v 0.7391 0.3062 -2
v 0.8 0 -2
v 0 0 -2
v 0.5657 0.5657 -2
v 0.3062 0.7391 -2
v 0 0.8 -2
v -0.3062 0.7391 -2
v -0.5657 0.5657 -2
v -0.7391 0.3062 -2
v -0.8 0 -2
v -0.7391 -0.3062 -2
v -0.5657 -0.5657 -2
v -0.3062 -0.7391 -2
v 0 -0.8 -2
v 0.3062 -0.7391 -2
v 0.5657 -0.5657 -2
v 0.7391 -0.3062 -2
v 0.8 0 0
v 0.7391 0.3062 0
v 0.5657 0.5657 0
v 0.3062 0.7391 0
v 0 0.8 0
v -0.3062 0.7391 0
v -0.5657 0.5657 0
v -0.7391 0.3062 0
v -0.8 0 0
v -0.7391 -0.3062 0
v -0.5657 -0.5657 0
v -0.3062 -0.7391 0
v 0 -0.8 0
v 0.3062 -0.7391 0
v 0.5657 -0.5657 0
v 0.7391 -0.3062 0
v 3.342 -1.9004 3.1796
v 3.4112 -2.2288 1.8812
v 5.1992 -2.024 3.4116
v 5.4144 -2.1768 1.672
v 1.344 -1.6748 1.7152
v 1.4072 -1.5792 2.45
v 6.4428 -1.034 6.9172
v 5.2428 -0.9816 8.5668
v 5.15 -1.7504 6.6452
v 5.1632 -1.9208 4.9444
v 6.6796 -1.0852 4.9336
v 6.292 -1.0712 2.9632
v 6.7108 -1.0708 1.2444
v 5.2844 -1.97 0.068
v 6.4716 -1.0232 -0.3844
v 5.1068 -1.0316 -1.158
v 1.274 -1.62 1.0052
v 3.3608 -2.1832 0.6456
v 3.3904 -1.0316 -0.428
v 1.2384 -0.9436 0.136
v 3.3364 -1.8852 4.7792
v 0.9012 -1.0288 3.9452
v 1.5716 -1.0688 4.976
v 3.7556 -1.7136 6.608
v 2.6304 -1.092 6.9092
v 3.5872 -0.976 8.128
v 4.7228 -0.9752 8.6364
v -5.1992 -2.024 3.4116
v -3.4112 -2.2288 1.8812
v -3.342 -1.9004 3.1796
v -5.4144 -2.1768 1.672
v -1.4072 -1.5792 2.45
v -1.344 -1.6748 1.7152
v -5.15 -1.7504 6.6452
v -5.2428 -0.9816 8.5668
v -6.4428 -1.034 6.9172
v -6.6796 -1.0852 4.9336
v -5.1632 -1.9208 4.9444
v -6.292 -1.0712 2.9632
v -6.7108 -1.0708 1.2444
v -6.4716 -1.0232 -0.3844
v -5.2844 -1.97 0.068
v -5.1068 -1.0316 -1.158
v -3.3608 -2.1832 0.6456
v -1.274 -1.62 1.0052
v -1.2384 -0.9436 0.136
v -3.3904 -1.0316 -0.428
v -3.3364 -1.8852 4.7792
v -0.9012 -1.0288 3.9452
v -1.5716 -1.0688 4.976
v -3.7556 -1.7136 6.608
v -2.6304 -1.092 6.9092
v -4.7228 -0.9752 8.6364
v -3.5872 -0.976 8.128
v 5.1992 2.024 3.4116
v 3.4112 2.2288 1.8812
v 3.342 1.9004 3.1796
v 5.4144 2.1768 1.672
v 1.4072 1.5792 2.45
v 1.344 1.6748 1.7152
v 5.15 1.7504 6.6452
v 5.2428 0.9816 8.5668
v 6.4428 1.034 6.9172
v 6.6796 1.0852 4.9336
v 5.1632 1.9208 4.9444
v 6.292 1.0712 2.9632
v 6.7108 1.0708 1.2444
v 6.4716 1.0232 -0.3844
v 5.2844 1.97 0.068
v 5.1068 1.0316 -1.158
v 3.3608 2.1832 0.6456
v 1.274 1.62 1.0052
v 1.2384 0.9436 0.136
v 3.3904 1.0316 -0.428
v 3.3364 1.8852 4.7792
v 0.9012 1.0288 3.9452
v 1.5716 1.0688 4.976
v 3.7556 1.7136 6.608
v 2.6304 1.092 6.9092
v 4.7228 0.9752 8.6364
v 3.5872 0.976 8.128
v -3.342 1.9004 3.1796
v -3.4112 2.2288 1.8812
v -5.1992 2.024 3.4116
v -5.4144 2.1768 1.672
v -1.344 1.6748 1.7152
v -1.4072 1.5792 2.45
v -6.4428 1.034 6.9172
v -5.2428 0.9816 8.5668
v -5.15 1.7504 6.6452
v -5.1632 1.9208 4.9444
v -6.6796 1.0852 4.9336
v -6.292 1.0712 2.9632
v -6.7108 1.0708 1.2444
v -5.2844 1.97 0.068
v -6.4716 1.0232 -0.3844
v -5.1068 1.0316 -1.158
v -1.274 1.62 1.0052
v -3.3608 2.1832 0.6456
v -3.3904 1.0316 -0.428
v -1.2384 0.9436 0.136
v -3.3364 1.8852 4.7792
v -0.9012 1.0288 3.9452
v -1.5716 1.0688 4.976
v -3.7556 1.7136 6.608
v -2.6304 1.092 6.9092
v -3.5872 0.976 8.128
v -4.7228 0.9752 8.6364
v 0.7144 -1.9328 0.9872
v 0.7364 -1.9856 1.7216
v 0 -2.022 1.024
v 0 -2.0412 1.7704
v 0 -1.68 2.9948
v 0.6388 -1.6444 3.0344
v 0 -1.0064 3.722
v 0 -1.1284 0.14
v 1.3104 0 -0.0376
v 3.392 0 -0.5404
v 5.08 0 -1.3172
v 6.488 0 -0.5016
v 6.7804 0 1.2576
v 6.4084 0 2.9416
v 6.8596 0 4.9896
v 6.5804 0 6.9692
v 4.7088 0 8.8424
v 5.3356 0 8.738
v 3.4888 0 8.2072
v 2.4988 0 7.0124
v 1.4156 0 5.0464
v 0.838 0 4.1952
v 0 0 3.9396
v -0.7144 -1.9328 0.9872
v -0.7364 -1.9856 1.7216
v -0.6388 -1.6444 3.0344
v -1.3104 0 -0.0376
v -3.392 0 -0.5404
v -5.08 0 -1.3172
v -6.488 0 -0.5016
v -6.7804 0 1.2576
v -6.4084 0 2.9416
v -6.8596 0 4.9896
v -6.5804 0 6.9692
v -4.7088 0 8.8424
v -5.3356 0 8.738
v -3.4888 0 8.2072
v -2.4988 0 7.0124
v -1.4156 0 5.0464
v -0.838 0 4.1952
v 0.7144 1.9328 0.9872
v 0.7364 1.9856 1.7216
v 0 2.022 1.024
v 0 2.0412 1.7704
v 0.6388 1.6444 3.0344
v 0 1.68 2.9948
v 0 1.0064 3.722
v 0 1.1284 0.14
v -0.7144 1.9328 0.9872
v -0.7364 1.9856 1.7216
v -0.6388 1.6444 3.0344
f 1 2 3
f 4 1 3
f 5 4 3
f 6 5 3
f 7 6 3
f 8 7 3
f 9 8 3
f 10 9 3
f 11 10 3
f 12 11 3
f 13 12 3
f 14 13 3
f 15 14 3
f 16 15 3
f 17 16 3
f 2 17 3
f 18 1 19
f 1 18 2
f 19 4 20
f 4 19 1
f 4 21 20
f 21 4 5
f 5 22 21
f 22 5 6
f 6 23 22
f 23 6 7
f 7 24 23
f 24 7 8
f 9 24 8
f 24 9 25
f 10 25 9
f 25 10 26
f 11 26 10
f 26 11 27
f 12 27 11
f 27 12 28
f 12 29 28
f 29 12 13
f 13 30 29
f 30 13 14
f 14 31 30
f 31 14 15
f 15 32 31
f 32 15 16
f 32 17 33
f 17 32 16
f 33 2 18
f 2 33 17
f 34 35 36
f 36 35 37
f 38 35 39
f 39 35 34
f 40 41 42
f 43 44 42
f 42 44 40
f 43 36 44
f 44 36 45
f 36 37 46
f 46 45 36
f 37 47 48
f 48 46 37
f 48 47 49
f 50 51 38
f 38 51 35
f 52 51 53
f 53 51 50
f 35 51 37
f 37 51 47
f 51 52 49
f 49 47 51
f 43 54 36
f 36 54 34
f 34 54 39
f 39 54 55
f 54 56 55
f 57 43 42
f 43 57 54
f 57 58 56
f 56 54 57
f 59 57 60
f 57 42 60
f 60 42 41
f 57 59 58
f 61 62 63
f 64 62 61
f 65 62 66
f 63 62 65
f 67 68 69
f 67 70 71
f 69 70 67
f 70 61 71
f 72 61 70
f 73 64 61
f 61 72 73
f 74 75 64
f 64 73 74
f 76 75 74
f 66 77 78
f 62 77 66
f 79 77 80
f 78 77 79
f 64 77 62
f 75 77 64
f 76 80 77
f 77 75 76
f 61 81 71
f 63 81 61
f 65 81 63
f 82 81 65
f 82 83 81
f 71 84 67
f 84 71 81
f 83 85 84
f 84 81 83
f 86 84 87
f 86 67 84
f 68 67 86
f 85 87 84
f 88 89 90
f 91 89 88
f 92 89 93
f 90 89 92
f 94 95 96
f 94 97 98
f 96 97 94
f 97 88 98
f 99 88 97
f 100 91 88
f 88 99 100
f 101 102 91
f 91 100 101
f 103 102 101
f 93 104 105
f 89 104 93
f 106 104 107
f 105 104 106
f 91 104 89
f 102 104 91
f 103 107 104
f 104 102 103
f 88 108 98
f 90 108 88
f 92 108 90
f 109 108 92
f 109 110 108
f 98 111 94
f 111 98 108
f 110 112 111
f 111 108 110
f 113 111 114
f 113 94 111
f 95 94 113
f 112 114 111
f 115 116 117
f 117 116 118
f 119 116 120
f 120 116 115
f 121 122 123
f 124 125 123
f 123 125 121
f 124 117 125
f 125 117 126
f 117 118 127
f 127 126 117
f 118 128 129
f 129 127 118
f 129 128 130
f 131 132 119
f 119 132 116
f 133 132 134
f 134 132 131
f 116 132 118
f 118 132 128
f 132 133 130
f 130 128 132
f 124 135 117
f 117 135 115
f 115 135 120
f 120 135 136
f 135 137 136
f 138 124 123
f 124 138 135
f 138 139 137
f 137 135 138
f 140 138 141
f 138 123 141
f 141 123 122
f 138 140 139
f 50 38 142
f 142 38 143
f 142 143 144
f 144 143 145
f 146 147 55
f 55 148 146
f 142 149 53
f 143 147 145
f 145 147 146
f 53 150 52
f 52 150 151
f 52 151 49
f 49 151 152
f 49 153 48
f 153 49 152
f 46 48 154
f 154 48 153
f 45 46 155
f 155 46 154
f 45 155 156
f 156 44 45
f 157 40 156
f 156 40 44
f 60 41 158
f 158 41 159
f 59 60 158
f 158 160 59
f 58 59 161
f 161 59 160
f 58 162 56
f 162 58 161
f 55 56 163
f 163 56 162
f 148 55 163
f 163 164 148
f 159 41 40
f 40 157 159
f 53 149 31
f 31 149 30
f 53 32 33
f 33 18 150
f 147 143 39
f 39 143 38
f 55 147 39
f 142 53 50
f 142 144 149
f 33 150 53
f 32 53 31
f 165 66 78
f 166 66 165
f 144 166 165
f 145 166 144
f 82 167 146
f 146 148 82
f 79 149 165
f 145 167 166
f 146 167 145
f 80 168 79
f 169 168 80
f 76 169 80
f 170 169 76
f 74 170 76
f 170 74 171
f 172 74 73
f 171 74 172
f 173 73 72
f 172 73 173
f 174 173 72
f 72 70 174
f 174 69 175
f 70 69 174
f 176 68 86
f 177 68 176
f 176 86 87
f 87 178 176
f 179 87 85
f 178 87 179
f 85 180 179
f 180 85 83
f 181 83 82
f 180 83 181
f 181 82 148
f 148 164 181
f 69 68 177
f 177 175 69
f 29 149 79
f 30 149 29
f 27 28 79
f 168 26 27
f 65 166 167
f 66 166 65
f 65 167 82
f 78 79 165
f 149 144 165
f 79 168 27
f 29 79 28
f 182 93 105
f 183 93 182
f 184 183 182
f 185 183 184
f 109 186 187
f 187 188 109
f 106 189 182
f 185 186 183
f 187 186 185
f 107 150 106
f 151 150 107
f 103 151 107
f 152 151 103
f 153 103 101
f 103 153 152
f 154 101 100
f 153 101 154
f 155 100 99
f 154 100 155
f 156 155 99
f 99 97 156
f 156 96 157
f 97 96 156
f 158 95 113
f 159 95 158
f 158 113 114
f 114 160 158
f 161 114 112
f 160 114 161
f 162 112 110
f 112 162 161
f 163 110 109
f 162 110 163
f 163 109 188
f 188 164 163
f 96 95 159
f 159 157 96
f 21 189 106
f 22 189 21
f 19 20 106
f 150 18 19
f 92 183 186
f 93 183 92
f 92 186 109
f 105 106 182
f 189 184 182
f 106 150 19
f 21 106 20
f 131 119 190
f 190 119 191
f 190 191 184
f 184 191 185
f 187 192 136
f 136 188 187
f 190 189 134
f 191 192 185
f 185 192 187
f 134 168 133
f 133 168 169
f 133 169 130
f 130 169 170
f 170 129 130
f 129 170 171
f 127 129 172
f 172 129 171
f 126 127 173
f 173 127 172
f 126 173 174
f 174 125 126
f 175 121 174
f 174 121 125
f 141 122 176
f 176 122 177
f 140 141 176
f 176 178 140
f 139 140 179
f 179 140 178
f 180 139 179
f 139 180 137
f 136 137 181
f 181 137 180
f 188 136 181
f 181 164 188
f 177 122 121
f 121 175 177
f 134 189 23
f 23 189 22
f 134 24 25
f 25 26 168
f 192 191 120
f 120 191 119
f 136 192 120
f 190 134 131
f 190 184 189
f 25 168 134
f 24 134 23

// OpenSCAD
// file: ../p/4-4edge.scad
use <../lib.scad>
function ldraw_lib__4_4edge() = [
// 0 Circle 1.0
// 0 Name: 4-4edge.dat
// 0 Author: James Jessiman
// 0 !LDRAW_ORG Primitive UPDATE 2017-01
// 0 !LICENSE Licensed under CC BY 4.0 : see CAreadme.txt
// 
// 0 BFC CERTIFY CCW
  [0,"BFC","CERTIFY"],
  [0,"BFC","CCW"],
// 
// 0 !HISTORY 1998-12-15 [PTadmin] Official Update 1998-10
// 0 !HISTORY 2005-12-28 [PTadmin] Official Update 2005-01
// 0 !HISTORY 2007-06-24 [PTadmin] Header formatted for Contributor Agreement
// 0 !HISTORY 2008-07-01 [PTadmin] Official Update 2008-01
// 0 !HISTORY 2017-01-15 [Steffen] BFCed
// 0 !HISTORY 2017-12-30 [PTadmin] Official Update 2017-01
// 
// 
// 2 24 1 0 0 0.9239 0 0.3827
  [2,24,1,0,0,0.9239,0,0.3827],
// 2 24 0.9239 0 0.3827 0.7071 0 0.7071
  [2,24,0.9239,0,0.3827,0.7071,0,0.7071],
// 2 24 0.7071 0 0.7071 0.3827 0 0.9239
  [2,24,0.7071,0,0.7071,0.3827,0,0.9239],
// 2 24 0.3827 0 0.9239 0 0 1
  [2,24,0.3827,0,0.9239,0,0,1],
// 2 24 0 0 1 -0.3827 0 0.9239
  [2,24,0,0,1,-0.3827,0,0.9239],
// 2 24 -0.3827 0 0.9239 -0.7071 0 0.7071
  [2,24,-0.3827,0,0.9239,-0.7071,0,0.7071],
// 2 24 -0.7071 0 0.7071 -0.9239 0 0.3827
  [2,24,-0.7071,0,0.7071,-0.9239,0,0.3827],
// 2 24 -0.9239 0 0.3827 -1 0 -0
  [2,24,-0.9239,0,0.3827,-1,0,-0],
// 2 24 -1 0 -0 -0.9239 0 -0.3827
  [2,24,-1,0,-0,-0.9239,0,-0.3827],
// 2 24 -0.9239 0 -0.3827 -0.7071 0 -0.7071
  [2,24,-0.9239,0,-0.3827,-0.7071,0,-0.7071],
// 2 24 -0.7071 0 -0.7071 -0.3827 0 -0.9239
  [2,24,-0.7071,0,-0.7071,-0.3827,0,-0.9239],
// 2 24 -0.3827 0 -0.9239 0 0 -1
  [2,24,-0.3827,0,-0.9239,0,0,-1],
// 2 24 0 0 -1 0.3827 0 -0.9239
  [2,24,0,0,-1,0.3827,0,-0.9239],
// 2 24 0.3827 0 -0.9239 0.7071 0 -0.7071
  [2,24,0.3827,0,-0.9239,0.7071,0,-0.7071],
// 2 24 0.7071 0 -0.7071 0.9239 0 -0.3827
  [2,24,0.7071,0,-0.7071,0.9239,0,-0.3827],
// 2 24 0.9239 0 -0.3827 1 0 0
  [2,24,0.9239,0,-0.3827,1,0,0],
];
module ldraw_lib__4_4edge(step=0, col=false, unit=2/5, alt=false, line=0.2, solid=!$preview)
    makepoly(ldraw_lib__4_4edge(), step=step, col=col, unit=unit, alt=alt, line=line, solid=solid);
ldraw_lib__4_4edge(line=0.2);
// file: ../p/4-4disc.scad
use <../lib.scad>
function ldraw_lib__4_4disc() = [
// 0 Disc 1.0
// 0 Name: 4-4disc.dat
// 0 Author: James Jessiman
// 0 !LDRAW_ORG Primitive UPDATE 2002-02
// 0 !LICENSE Licensed under CC BY 4.0 : see CAreadme.txt
// 
// 0 BFC CERTIFY CCW
  [0,"BFC","CERTIFY"],
  [0,"BFC","CCW"],
// 
// 0 !HISTORY 1998-12-15 [PTadmin] Official Update 1998-10
// 0 !HISTORY 2002-03-23 [sbliss] Added BFC statement
// 0 !HISTORY 2002-04-25 [PTadmin] Official Update 2002-02
// 0 !HISTORY 2007-06-24 [PTadmin] Header formatted for Contributor Agreement
// 0 !HISTORY 2008-07-01 [PTadmin] Official Update 2008-01
// 
// 
// 3 16 0 0 0 1 0 0 0.9239 0 0.3827
  [3,16,0,0,0,1,0,0,0.9239,0,0.3827],
// 3 16 0 0 0 0.9239 0 0.3827 0.7071 0 0.7071
  [3,16,0,0,0,0.9239,0,0.3827,0.7071,0,0.7071],
// 3 16 0 0 0 0.7071 0 0.7071 0.3827 0 0.9239
  [3,16,0,0,0,0.7071,0,0.7071,0.3827,0,0.9239],
// 3 16 0 0 0 0.3827 0 0.9239 0 0 1
  [3,16,0,0,0,0.3827,0,0.9239,0,0,1],
// 3 16 0 0 0 0 0 1 -0.3827 0 0.9239
  [3,16,0,0,0,0,0,1,-0.3827,0,0.9239],
// 3 16 0 0 0 -0.3827 0 0.9239 -0.7071 0 0.7071
  [3,16,0,0,0,-0.3827,0,0.9239,-0.7071,0,0.7071],
// 3 16 0 0 0 -0.7071 0 0.7071 -0.9239 0 0.3827
  [3,16,0,0,0,-0.7071,0,0.7071,-0.9239,0,0.3827],
// 3 16 0 0 0 -0.9239 0 0.3827 -1 0 -0
  [3,16,0,0,0,-0.9239,0,0.3827,-1,0,-0],
// 3 16 0 0 0 -1 0 -0 -0.9239 0 -0.3827
  [3,16,0,0,0,-1,0,-0,-0.9239,0,-0.3827],
// 3 16 0 0 0 -0.9239 0 -0.3827 -0.7071 0 -0.7071
  [3,16,0,0,0,-0.9239,0,-0.3827,-0.7071,0,-0.7071],
// 3 16 0 0 0 -0.7071 0 -0.7071 -0.3827 0 -0.9239
  [3,16,0,0,0,-0.7071,0,-0.7071,-0.3827,0,-0.9239],
// 3 16 0 0 0 -0.3827 0 -0.9239 0 0 -1
  [3,16,0,0,0,-0.3827,0,-0.9239,0,0,-1],
// 3 16 0 0 0 0 0 -1 0.3827 0 -0.9239
  [3,16,0,0,0,0,0,-1,0.3827,0,-0.9239],
// 3 16 0 0 0 0.3827 0 -0.9239 0.7071 0 -0.7071
  [3,16,0,0,0,0.3827,0,-0.9239,0.7071,0,-0.7071],
// 3 16 0 0 0 0.7071 0 -0.7071 0.9239 0 -0.3827
  [3,16,0,0,0,0.7071,0,-0.7071,0.9239,0,-0.3827],
// 3 16 0 0 0 0.9239 0 -0.3827 1 0 0
  [3,16,0,0,0,0.9239,0,-0.3827,1,0,0],
// 0
];
module ldraw_lib__4_4disc(step=0, col=false, unit=2/5, alt=false, line=0.2, solid=!$preview)
    makepoly(ldraw_lib__4_4disc(), step=step, col=col, unit=unit, alt=alt, line=line, solid=solid);
ldraw_lib__4_4disc(line=0.2);
// file: ../p/4-4cyli.scad
use <../lib.scad>
function ldraw_lib__4_4cyli() = [
// 0 Cylinder 1.0
// 0 Name: 4-4cyli.dat
// 0 Author: James Jessiman
// 0 !LDRAW_ORG Primitive UPDATE 2005-01
// 0 !LICENSE Licensed under CC BY 4.0 : see CAreadme.txt
// 
// 0 BFC CERTIFY CCW
  [0,"BFC","CERTIFY"],
  [0,"BFC","CCW"],
// 
// 0 !HISTORY 1998-12-15 [PTadmin] Official Update 1998-10
// 0 !HISTORY 2002-03-23 [sbliss] Added BFC statement; merged headers from files in distributions LDraw 0.27 and Complete.
// 0 !HISTORY 2002-04-25 [PTadmin] Official Update 2002-02
// 0 !HISTORY 2004-12-14 [guyvivan] BFC CCW
// 0 !HISTORY 2005-12-28 [PTadmin] Official Update 2005-01
// 0 !HISTORY 2007-06-24 [PTadmin] Header formatted for Contributor Agreement
// 0 !HISTORY 2008-07-01 [PTadmin] Official Update 2008-01
// 
// 
// 4 16 1 1 0 0.9239 1 0.3827 0.9239 0 0.3827 1 0 0
  [4,16,1,1,0,0.9239,1,0.3827,0.9239,0,0.3827,1,0,0],
// 5 24 1 0 0 1 1 0 0.9239 0 0.3827 0.9239 0 -0.3827
  [5,24,1,0,0,1,1,0,0.9239,0,0.3827,0.9239,0,-0.3827],
// 4 16 0.9239 1 0.3827 0.7071 1 0.7071 0.7071 0 0.7071 0.9239 0 0.3827
  [4,16,0.9239,1,0.3827,0.7071,1,0.7071,0.7071,0,0.7071,0.9239,0,0.3827],
// 5 24 0.9239 0 0.3827 0.9239 1 0.3827 0.7071 0 0.7071 1 0 0
  [5,24,0.9239,0,0.3827,0.9239,1,0.3827,0.7071,0,0.7071,1,0,0],
// 4 16 0.7071 1 0.7071 0.3827 1 0.9239 0.3827 0 0.9239 0.7071 0 0.7071
  [4,16,0.7071,1,0.7071,0.3827,1,0.9239,0.3827,0,0.9239,0.7071,0,0.7071],
// 5 24 0.7071 0 0.7071 0.7071 1 0.7071 0.3827 0 0.9239 0.9239 0 0.3827
  [5,24,0.7071,0,0.7071,0.7071,1,0.7071,0.3827,0,0.9239,0.9239,0,0.3827],
// 4 16 0.3827 1 0.9239 0 1 1 0 0 1 0.3827 0 0.9239
  [4,16,0.3827,1,0.9239,0,1,1,0,0,1,0.3827,0,0.9239],
// 5 24 0.3827 0 0.9239 0.3827 1 0.9239 0 0 1 0.7071 0 0.7071
  [5,24,0.3827,0,0.9239,0.3827,1,0.9239,0,0,1,0.7071,0,0.7071],
// 4 16 0 1 1 -0.3827 1 0.9239 -0.3827 0 0.9239 0 0 1
  [4,16,0,1,1,-0.3827,1,0.9239,-0.3827,0,0.9239,0,0,1],
// 5 24 0 0 1 0 1 1 -0.3827 0 0.9239 0.3827 0 0.9239
  [5,24,0,0,1,0,1,1,-0.3827,0,0.9239,0.3827,0,0.9239],
// 4 16 -0.3827 1 0.9239 -0.7071 1 0.7071 -0.7071 0 0.7071 -0.3827 0 0.9239
  [4,16,-0.3827,1,0.9239,-0.7071,1,0.7071,-0.7071,0,0.7071,-0.3827,0,0.9239],
// 5 24 -0.3827 0 0.9239 -0.3827 1 0.9239 -0.7071 0 0.7071 0 0 1
  [5,24,-0.3827,0,0.9239,-0.3827,1,0.9239,-0.7071,0,0.7071,0,0,1],
// 4 16 -0.7071 1 0.7071 -0.9239 1 0.3827 -0.9239 0 0.3827 -0.7071 0 0.7071
  [4,16,-0.7071,1,0.7071,-0.9239,1,0.3827,-0.9239,0,0.3827,-0.7071,0,0.7071],
// 5 24 -0.7071 0 0.7071 -0.7071 1 0.7071 -0.9239 0 0.3827 -0.3827 0 0.9239
  [5,24,-0.7071,0,0.7071,-0.7071,1,0.7071,-0.9239,0,0.3827,-0.3827,0,0.9239],
// 4 16 -0.9239 1 0.3827 -1 1 0 -1 0 0 -0.9239 0 0.3827
  [4,16,-0.9239,1,0.3827,-1,1,0,-1,0,0,-0.9239,0,0.3827],
// 5 24 -0.9239 0 0.3827 -0.9239 1 0.3827 -1 0 0 -0.7071 0 0.7071
  [5,24,-0.9239,0,0.3827,-0.9239,1,0.3827,-1,0,0,-0.7071,0,0.7071],
// 4 16 -1 1 0 -0.9239 1 -0.3827 -0.9239 0 -0.3827 -1 0 0
  [4,16,-1,1,0,-0.9239,1,-0.3827,-0.9239,0,-0.3827,-1,0,0],
// 5 24 -1 0 0 -1 1 0 -0.9239 0 -0.3827 -0.9239 0 0.3827
  [5,24,-1,0,0,-1,1,0,-0.9239,0,-0.3827,-0.9239,0,0.3827],
// 4 16 -0.9239 1 -0.3827 -0.7071 1 -0.7071 -0.7071 0 -0.7071 -0.9239 0 -0.3827
  [4,16,-0.9239,1,-0.3827,-0.7071,1,-0.7071,-0.7071,0,-0.7071,-0.9239,0,-0.3827],
// 5 24 -0.9239 0 -0.3827 -0.9239 1 -0.3827 -0.7071 0 -0.7071 -1 0 0
  [5,24,-0.9239,0,-0.3827,-0.9239,1,-0.3827,-0.7071,0,-0.7071,-1,0,0],
// 4 16 -0.7071 1 -0.7071 -0.3827 1 -0.9239 -0.3827 0 -0.9239 -0.7071 0 -0.7071
  [4,16,-0.7071,1,-0.7071,-0.3827,1,-0.9239,-0.3827,0,-0.9239,-0.7071,0,-0.7071],
// 5 24 -0.7071 0 -0.7071 -0.7071 1 -0.7071 -0.3827 0 -0.9239 -0.9239 0 -0.3827
  [5,24,-0.7071,0,-0.7071,-0.7071,1,-0.7071,-0.3827,0,-0.9239,-0.9239,0,-0.3827],
// 4 16 -0.3827 1 -0.9239 0 1 -1 0 0 -1 -0.3827 0 -0.9239
  [4,16,-0.3827,1,-0.9239,0,1,-1,0,0,-1,-0.3827,0,-0.9239],
// 5 24 -0.3827 0 -0.9239 -0.3827 1 -0.9239 0 0 -1 -0.7071 0 -0.7071
  [5,24,-0.3827,0,-0.9239,-0.3827,1,-0.9239,0,0,-1,-0.7071,0,-0.7071],
// 4 16 0 1 -1 0.3827 1 -0.9239 0.3827 0 -0.9239 0 0 -1
  [4,16,0,1,-1,0.3827,1,-0.9239,0.3827,0,-0.9239,0,0,-1],
// 5 24 0 0 -1 0 1 -1 0.3827 0 -0.9239 -0.3827 0 -0.9239
  [5,24,0,0,-1,0,1,-1,0.3827,0,-0.9239,-0.3827,0,-0.9239],
// 4 16 0.3827 1 -0.9239 0.7071 1 -0.7071 0.7071 0 -0.7071 0.3827 0 -0.9239
  [4,16,0.3827,1,-0.9239,0.7071,1,-0.7071,0.7071,0,-0.7071,0.3827,0,-0.9239],
// 5 24 0.3827 0 -0.9239 0.3827 1 -0.9239 0.7071 0 -0.7071 0 0 -1
  [5,24,0.3827,0,-0.9239,0.3827,1,-0.9239,0.7071,0,-0.7071,0,0,-1],
// 4 16 0.7071 1 -0.7071 0.9239 1 -0.3827 0.9239 0 -0.3827 0.7071 0 -0.7071
  [4,16,0.7071,1,-0.7071,0.9239,1,-0.3827,0.9239,0,-0.3827,0.7071,0,-0.7071],
// 5 24 0.7071 0 -0.7071 0.7071 1 -0.7071 0.9239 0 -0.3827 0.3827 0 -0.9239
  [5,24,0.7071,0,-0.7071,0.7071,1,-0.7071,0.9239,0,-0.3827,0.3827,0,-0.9239],
// 4 16 0.9239 1 -0.3827 1 1 0 1 0 0 0.9239 0 -0.3827
  [4,16,0.9239,1,-0.3827,1,1,0,1,0,0,0.9239,0,-0.3827],
// 5 24 0.9239 0 -0.3827 0.9239 1 -0.3827 1 0 0 0.7071 0 -0.7071
  [5,24,0.9239,0,-0.3827,0.9239,1,-0.3827,1,0,0,0.7071,0,-0.7071],
// 0
];
module ldraw_lib__4_4cyli(step=0, col=false, unit=2/5, alt=false, line=0.2, solid=!$preview)
    makepoly(ldraw_lib__4_4cyli(), step=step, col=col, unit=unit, alt=alt, line=line, solid=solid);
ldraw_lib__4_4cyli(line=0.2);
// file: ../p/4-4cylc.scad
use <../lib.scad>
use <4-4cyli.scad>
use <4-4disc.scad>
use <4-4edge.scad>
function ldraw_lib__4_4cylc() = [
// 0 Cylinder Closed 1.0
// 0 Name: 4-4cylc.dat
// 0 Author: Alex Taylor [anathema]
// 0 !LDRAW_ORG Primitive UPDATE 2009-02
// 0 !LICENSE Licensed under CC BY 4.0 : see CAreadme.txt
// 
// 0 BFC CERTIFY CCW
  [0,"BFC","CERTIFY"],
  [0,"BFC","CCW"],
// 
// 0 !HISTORY 2008-12-29 [cwdee] Removed one disc
// 0 !HISTORY 2009-09-03 [PTadmin] Official Update 2009-02
// 
// 
// 1 16 0 0 0 1 0 0 0 1 0 0 0 1 4-4edge.dat
  [1,16,0,0,0,1,0,0,0,1,0,0,0,1, ldraw_lib__4_4edge()],
// 1 16 0 1 0 1 0 0 0 1 0 0 0 1 4-4edge.dat
  [1,16,0,1,0,1,0,0,0,1,0,0,0,1, ldraw_lib__4_4edge()],
// 1 16 0 0 0 1 0 0 0 1 0 0 0 1 4-4disc.dat
  [1,16,0,0,0,1,0,0,0,1,0,0,0,1, ldraw_lib__4_4disc()],
// 1 16 0 0 0 1 0 0 0 1 0 0 0 1 4-4cyli.dat
  [1,16,0,0,0,1,0,0,0,1,0,0,0,1, ldraw_lib__4_4cyli()],
// 0
];
module ldraw_lib__4_4cylc(step=0, col=false, unit=2/5, alt=false, line=0.2, solid=!$preview)
    makepoly(ldraw_lib__4_4cylc(), step=step, col=col, unit=unit, alt=alt, line=line, solid=solid);
ldraw_lib__4_4cylc(line=0.2);
// main file
use <../lib.scad>
use <../p/4-4cylc.scad>
use <s/24634s01.scad>
use <s/24634s02.scad>
function ldraw_lib__24634() = [
// 0 Minifig Hair Decoration Bow Large with Pin
// 0 Name: 24634.dat
// 0 Author: Philippe Hurbain [Philo]
// 0 !LDRAW_ORG Part UPDATE 2024-11
// 0 !LICENSE Licensed under CC BY 4.0 : see CAreadme.txt
// 
// 0 BFC CERTIFY CCW
  [0,"BFC","CERTIFY"],
  [0,"BFC","CCW"],
// 
// 0 !CATEGORY Minifig Accessory
// 0 !KEYWORDS daisy, Disney, Minnie
// 
// 0 !HISTORY 2018-01-28 {LEGO Digital Designer} Original part shape
// 0 !HISTORY 2022-02-15 [Philo] File preparation for LDraw Parts Tracker
// 0 !HISTORY 2024-12-30 [OrionP] Official Update 2024-11
// 
// 
// 1 16 0 5 0 2 0 0 0 -5 0 0 0 2 4-4cylc.dat
  [1,16,0,5,0,2,0,0,0,-5,0,0,0,2, ldraw_lib__4_4cylc()],
// 1 16 0 0 0 1 0 0 0 1 0 0 0 1 s\24634s01.dat
  [1,16,0,0,0,1,0,0,0,1,0,0,0,1, ldraw_lib__s__24634s01()],
// 1 16 0 0 0 -1 0 0 0 1 0 0 0 1 s\24634s01.dat
  [1,16,0,0,0,-1,0,0,0,1,0,0,0,1, ldraw_lib__s__24634s01()],
// 1 16 0 0 0 1 0 0 0 1 0 0 0 -1 s\24634s01.dat
  [1,16,0,0,0,1,0,0,0,1,0,0,0,-1, ldraw_lib__s__24634s01()],
// 1 16 0 0 0 -1 0 0 0 1 0 0 0 -1 s\24634s01.dat
  [1,16,0,0,0,-1,0,0,0,1,0,0,0,-1, ldraw_lib__s__24634s01()],
// 1 16 0 0 0 1 0 0 0 1 0 0 0 1 s\24634s02.dat
  [1,16,0,0,0,1,0,0,0,1,0,0,0,1, ldraw_lib__s__24634s02()],
// 1 16 0 0 0 -1 0 0 0 1 0 0 0 1 s\24634s02.dat
  [1,16,0,0,0,-1,0,0,0,1,0,0,0,1, ldraw_lib__s__24634s02()],
// 1 16 0 0 0 1 0 0 0 1 0 0 0 -1 s\24634s02.dat
  [1,16,0,0,0,1,0,0,0,1,0,0,0,-1, ldraw_lib__s__24634s02()],
// 1 16 0 0 0 -1 0 0 0 1 0 0 0 -1 s\24634s02.dat
  [1,16,0,0,0,-1,0,0,0,1,0,0,0,-1, ldraw_lib__s__24634s02()],
];
module ldraw_lib__24634(step=0, col=false, unit=2/5, alt=false, line=0.2, solid=!$preview)
    makepoly(ldraw_lib__24634(), step=step, col=col, unit=unit, alt=alt, line=line, solid=solid);
ldraw_lib__24634(line=0.2);
